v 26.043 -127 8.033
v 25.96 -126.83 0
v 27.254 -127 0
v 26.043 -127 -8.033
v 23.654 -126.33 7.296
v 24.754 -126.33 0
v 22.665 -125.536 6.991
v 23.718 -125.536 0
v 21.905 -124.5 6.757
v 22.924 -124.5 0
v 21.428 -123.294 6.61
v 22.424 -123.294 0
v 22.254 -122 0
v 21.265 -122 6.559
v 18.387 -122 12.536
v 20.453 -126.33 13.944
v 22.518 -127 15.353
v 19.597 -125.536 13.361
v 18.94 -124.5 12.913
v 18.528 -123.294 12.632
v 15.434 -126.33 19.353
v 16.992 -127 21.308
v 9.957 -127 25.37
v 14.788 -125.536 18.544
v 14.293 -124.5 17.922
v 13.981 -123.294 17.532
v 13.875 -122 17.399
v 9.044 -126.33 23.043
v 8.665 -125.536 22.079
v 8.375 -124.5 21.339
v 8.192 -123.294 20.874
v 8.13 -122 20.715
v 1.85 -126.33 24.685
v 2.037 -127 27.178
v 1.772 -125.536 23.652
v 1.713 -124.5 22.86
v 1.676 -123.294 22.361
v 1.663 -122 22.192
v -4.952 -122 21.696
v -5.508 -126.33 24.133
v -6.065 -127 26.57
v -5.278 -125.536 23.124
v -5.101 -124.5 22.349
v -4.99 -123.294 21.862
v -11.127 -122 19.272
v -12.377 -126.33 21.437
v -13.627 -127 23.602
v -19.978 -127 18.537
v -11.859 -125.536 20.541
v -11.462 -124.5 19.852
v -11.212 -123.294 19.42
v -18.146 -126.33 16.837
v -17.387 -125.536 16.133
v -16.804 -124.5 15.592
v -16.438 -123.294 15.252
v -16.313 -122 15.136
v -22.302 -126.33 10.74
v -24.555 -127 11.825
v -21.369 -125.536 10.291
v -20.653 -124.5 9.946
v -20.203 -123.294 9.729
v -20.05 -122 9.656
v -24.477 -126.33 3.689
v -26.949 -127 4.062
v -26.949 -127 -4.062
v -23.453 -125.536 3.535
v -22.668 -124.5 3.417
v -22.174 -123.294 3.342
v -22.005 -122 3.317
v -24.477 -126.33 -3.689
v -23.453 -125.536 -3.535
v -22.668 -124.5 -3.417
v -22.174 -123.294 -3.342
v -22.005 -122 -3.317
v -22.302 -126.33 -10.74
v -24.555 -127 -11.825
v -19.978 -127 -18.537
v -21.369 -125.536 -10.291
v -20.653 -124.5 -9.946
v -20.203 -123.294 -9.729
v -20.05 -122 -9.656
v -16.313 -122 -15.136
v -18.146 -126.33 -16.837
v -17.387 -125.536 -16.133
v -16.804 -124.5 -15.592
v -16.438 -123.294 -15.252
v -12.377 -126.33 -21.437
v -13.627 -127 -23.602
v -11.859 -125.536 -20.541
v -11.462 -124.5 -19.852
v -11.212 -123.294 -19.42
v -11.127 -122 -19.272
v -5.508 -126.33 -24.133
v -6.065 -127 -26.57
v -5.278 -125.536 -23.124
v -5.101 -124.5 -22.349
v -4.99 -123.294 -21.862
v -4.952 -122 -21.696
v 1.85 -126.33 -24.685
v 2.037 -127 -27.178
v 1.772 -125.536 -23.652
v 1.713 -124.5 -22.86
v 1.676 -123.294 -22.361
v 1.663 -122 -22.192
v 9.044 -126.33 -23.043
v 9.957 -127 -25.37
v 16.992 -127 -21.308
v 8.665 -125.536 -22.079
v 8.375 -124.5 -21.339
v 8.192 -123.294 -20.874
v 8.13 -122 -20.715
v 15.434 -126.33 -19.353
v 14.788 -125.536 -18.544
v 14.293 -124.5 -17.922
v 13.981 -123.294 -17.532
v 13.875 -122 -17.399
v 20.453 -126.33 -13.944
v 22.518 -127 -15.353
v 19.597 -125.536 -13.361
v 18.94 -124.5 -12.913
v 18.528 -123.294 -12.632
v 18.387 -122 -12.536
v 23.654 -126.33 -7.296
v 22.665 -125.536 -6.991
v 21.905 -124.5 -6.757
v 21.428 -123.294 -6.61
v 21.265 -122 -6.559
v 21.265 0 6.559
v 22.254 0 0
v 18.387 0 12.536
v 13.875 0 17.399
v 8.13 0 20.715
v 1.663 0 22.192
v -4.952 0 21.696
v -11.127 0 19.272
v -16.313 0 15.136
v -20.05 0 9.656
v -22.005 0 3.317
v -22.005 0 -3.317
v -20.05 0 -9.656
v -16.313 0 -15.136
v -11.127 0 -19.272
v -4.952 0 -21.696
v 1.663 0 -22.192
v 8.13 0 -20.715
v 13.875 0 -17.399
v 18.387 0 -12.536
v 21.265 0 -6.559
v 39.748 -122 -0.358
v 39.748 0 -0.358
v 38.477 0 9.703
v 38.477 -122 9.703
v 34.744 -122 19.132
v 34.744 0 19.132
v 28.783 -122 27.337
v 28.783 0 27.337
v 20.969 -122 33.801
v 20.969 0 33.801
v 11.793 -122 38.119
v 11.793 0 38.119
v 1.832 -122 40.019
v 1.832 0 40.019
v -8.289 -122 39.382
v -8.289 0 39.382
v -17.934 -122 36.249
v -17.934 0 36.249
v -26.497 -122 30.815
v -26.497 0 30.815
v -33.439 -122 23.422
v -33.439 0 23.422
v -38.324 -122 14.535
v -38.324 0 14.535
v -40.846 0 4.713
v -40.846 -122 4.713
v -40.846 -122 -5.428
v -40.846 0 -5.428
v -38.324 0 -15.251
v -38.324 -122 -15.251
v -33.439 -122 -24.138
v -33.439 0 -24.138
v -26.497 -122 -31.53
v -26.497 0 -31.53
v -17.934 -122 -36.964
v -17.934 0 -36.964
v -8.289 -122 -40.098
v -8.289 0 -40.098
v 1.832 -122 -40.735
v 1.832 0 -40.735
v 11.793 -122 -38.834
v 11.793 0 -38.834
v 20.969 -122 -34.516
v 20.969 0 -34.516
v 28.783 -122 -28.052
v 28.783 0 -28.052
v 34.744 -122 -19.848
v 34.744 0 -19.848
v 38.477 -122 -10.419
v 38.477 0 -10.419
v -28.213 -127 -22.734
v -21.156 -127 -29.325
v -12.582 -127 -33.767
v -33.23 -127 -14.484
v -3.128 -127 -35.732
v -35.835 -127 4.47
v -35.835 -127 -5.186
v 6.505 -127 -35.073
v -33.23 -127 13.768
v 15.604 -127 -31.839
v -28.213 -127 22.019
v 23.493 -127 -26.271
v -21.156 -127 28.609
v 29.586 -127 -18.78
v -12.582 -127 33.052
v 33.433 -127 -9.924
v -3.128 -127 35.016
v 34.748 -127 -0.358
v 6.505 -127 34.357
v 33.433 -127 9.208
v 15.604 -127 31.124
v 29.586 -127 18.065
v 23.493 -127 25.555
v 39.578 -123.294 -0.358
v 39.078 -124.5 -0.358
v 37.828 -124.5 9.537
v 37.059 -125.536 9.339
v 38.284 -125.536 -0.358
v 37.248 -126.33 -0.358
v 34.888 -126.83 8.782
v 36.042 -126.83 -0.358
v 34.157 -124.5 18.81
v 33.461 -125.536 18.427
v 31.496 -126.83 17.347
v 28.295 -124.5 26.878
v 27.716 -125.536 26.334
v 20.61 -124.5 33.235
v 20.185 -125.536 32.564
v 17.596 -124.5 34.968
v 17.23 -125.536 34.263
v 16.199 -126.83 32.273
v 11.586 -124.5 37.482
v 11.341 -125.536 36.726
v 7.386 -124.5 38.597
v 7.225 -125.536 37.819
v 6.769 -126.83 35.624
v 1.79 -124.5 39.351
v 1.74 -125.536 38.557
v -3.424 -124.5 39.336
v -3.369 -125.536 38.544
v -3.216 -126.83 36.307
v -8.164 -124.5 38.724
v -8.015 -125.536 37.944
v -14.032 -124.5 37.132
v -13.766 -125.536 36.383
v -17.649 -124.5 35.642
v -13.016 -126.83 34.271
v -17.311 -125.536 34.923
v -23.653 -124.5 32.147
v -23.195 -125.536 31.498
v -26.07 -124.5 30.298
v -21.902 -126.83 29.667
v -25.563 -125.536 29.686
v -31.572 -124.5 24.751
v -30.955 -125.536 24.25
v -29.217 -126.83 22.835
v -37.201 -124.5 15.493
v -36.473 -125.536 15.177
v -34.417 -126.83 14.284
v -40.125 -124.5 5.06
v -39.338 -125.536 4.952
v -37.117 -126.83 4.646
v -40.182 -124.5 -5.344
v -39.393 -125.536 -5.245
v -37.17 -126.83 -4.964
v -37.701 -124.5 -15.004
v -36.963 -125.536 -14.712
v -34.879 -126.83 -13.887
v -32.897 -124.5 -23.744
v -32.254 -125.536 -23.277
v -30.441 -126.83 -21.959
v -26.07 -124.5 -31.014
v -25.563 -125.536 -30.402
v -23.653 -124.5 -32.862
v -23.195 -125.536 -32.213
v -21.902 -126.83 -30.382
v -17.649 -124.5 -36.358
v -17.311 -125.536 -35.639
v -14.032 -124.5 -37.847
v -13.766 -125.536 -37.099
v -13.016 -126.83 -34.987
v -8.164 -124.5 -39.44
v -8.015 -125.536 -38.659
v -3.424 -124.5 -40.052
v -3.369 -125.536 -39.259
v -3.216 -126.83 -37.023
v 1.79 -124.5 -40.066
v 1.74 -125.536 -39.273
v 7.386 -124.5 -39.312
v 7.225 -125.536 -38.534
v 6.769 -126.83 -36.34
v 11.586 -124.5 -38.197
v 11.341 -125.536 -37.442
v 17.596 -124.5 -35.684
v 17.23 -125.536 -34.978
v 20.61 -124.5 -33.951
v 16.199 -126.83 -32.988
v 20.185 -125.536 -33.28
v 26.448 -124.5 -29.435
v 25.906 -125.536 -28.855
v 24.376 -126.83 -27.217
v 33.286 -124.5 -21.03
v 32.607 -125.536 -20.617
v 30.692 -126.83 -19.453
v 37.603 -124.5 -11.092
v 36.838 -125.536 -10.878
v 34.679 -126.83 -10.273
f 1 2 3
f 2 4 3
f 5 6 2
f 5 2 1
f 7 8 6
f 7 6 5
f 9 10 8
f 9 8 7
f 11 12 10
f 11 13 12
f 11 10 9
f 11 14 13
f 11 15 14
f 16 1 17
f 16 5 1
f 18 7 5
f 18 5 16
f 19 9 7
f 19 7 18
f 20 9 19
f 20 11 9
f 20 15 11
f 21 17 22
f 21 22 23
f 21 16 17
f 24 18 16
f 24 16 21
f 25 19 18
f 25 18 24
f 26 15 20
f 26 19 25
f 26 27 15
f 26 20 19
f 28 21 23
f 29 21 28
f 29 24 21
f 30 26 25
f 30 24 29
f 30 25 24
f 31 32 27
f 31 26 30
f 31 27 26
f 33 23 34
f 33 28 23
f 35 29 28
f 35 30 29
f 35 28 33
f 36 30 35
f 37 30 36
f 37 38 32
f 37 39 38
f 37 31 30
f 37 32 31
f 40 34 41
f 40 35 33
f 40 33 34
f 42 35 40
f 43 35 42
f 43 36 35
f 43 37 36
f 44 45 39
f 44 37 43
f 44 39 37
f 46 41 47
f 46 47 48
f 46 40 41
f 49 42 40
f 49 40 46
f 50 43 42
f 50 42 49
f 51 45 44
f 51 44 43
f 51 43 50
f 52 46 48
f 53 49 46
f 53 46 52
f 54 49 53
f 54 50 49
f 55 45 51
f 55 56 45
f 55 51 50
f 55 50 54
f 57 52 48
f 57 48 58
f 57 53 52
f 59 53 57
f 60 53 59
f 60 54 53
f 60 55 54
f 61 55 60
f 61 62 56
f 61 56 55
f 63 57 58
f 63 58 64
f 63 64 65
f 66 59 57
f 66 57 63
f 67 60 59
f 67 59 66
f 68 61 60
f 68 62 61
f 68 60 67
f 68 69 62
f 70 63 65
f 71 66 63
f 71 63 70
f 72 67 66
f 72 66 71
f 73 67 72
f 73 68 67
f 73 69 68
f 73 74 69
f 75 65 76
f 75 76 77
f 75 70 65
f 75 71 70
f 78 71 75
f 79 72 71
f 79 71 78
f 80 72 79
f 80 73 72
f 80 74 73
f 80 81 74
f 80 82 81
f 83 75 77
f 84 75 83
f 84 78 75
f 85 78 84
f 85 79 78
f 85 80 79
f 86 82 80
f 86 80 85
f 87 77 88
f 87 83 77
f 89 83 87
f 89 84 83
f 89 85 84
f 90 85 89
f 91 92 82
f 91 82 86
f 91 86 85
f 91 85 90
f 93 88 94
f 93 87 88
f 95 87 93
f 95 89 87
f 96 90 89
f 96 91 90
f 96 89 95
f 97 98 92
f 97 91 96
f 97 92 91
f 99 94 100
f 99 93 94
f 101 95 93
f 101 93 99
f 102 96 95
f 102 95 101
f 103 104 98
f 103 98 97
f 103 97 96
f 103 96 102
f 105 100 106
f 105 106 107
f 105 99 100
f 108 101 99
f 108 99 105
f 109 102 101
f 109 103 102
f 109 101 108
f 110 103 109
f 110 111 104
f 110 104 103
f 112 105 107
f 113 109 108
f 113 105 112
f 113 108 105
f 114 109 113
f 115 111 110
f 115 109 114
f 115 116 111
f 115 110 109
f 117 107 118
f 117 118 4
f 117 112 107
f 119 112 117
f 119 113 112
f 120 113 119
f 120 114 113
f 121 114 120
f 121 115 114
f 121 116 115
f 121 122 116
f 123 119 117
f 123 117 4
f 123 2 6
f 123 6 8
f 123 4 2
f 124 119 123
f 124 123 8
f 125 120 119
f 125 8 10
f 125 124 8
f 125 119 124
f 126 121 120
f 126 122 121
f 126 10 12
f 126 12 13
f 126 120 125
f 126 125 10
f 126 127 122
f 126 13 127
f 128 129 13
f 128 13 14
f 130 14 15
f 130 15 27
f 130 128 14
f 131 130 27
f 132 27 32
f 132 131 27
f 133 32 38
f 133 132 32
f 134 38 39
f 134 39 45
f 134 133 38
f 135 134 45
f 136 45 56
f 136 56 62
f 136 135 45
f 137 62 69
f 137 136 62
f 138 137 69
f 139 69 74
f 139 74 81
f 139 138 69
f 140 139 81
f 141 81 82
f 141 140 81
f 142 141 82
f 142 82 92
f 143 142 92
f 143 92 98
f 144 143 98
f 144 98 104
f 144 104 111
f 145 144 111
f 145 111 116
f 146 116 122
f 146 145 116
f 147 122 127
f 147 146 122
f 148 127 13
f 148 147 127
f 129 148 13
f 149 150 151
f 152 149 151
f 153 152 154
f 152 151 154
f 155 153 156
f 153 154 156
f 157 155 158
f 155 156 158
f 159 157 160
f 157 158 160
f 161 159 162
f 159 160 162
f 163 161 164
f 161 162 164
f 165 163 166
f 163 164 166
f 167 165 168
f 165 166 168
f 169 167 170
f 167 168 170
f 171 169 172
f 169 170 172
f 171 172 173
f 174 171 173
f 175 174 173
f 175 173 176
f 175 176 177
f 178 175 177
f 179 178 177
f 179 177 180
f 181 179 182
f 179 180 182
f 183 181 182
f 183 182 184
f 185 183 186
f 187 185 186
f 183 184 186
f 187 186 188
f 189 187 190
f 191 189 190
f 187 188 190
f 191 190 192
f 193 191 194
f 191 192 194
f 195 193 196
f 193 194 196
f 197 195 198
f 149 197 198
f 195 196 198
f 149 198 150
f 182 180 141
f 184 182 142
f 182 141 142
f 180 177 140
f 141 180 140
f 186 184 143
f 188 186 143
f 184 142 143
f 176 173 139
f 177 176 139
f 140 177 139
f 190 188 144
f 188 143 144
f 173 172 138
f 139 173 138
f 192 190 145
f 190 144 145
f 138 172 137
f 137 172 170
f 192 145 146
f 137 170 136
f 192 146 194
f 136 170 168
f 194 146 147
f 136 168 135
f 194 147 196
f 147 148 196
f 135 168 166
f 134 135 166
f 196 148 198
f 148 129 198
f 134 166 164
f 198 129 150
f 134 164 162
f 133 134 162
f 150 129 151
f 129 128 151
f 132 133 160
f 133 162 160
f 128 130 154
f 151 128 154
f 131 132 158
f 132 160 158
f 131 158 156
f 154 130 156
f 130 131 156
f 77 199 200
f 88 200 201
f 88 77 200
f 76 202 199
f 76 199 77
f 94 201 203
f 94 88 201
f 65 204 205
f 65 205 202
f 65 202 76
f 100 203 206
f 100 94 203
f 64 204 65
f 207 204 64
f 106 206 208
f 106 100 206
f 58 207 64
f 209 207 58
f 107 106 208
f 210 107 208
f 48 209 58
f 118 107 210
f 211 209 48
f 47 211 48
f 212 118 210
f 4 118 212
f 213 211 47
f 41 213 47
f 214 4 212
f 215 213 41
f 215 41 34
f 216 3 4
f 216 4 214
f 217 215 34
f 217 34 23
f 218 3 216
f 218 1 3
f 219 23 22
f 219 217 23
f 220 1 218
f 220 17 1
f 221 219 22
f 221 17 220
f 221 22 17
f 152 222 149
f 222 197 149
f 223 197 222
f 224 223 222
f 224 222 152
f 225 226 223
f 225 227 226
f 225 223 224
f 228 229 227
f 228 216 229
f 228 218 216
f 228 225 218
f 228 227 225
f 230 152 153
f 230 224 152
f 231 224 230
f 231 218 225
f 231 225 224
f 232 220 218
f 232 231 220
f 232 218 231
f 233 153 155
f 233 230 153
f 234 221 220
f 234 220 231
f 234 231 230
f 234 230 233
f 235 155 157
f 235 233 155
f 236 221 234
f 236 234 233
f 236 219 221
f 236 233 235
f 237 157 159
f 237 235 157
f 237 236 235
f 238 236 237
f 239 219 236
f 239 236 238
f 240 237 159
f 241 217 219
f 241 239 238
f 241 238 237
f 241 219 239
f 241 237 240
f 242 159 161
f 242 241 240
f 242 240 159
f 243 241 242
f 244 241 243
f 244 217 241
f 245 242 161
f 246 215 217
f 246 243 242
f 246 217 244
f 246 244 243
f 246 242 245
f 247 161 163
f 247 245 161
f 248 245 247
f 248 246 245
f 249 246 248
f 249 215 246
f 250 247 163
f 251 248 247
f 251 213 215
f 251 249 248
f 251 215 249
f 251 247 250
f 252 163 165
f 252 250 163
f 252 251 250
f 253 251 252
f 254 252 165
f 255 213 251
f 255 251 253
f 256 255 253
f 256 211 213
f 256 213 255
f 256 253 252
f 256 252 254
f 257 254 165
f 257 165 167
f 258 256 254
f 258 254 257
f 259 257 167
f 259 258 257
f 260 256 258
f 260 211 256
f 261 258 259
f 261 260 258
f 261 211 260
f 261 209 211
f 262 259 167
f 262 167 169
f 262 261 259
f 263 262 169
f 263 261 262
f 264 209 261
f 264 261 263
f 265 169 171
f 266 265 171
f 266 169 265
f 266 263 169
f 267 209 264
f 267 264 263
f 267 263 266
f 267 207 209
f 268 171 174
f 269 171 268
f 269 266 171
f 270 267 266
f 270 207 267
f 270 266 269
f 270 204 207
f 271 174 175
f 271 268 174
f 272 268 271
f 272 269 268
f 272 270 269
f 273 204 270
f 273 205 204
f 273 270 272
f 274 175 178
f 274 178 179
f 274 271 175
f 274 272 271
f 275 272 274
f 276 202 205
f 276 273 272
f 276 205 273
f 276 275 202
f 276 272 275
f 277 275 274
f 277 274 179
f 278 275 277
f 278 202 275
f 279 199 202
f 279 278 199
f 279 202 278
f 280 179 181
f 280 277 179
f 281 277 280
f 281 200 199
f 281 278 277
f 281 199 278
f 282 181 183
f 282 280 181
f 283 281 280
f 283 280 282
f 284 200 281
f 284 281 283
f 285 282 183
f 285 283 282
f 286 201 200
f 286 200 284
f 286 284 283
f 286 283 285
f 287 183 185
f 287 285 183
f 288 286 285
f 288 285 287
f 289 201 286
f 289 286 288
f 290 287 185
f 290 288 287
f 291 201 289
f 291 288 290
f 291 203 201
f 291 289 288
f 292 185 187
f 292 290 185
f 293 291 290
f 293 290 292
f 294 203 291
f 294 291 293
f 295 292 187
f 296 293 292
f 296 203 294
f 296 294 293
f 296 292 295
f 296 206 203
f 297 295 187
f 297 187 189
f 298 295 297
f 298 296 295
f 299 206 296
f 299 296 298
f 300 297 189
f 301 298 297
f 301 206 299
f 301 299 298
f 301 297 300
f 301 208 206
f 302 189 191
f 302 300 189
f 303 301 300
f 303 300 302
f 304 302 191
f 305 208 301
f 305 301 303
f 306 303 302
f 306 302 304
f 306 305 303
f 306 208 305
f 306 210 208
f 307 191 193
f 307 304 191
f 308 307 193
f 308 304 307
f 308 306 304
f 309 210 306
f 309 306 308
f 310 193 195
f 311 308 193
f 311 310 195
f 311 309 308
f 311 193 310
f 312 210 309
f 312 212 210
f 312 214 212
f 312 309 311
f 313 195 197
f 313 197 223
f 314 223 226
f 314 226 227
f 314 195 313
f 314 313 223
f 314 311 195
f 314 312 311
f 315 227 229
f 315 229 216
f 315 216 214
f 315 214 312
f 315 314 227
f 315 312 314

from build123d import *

# Parameters (mm, degrees)
F0_R     = 40.456666
F0_R_2   = 22.253777
F1_DEPTH = 127
F2_DEPTH = 50
F3_R     = 5
F4_R     = 5


with BuildPart() as f1:
    # F0 (on Front) → F1 (new body)
    with BuildSketch(Plane.XZ):
        with Locations((-0.708535, -0.357763)):
            Circle(F0_R)
        Circle(F0_R_2, mode=Mode.SUBTRACT)
    extrude(amount=F1_DEPTH)

    # F0 (on Front) → F2 (join)
    with BuildSketch(Plane.XZ):
        with Locations((-0.708535, -0.357763)):
            Circle(F0_R)
        Circle(F0_R_2, mode=Mode.SUBTRACT)
    extrude(amount=F2_DEPTH)

    # F3
    f3_edges = [f1.edges().sort_by_distance(p)[0] for p in [
        (-41.165201, -127, -0.357763),
    ]]
    fillet(f3_edges, radius=F3_R)

    # F4
    f4_edges = [f1.edges().sort_by_distance(p)[0] for p in [
        (-22.253777, -127, 0),
    ]]
    fillet(f4_edges, radius=F4_R)


solid = f1.part
